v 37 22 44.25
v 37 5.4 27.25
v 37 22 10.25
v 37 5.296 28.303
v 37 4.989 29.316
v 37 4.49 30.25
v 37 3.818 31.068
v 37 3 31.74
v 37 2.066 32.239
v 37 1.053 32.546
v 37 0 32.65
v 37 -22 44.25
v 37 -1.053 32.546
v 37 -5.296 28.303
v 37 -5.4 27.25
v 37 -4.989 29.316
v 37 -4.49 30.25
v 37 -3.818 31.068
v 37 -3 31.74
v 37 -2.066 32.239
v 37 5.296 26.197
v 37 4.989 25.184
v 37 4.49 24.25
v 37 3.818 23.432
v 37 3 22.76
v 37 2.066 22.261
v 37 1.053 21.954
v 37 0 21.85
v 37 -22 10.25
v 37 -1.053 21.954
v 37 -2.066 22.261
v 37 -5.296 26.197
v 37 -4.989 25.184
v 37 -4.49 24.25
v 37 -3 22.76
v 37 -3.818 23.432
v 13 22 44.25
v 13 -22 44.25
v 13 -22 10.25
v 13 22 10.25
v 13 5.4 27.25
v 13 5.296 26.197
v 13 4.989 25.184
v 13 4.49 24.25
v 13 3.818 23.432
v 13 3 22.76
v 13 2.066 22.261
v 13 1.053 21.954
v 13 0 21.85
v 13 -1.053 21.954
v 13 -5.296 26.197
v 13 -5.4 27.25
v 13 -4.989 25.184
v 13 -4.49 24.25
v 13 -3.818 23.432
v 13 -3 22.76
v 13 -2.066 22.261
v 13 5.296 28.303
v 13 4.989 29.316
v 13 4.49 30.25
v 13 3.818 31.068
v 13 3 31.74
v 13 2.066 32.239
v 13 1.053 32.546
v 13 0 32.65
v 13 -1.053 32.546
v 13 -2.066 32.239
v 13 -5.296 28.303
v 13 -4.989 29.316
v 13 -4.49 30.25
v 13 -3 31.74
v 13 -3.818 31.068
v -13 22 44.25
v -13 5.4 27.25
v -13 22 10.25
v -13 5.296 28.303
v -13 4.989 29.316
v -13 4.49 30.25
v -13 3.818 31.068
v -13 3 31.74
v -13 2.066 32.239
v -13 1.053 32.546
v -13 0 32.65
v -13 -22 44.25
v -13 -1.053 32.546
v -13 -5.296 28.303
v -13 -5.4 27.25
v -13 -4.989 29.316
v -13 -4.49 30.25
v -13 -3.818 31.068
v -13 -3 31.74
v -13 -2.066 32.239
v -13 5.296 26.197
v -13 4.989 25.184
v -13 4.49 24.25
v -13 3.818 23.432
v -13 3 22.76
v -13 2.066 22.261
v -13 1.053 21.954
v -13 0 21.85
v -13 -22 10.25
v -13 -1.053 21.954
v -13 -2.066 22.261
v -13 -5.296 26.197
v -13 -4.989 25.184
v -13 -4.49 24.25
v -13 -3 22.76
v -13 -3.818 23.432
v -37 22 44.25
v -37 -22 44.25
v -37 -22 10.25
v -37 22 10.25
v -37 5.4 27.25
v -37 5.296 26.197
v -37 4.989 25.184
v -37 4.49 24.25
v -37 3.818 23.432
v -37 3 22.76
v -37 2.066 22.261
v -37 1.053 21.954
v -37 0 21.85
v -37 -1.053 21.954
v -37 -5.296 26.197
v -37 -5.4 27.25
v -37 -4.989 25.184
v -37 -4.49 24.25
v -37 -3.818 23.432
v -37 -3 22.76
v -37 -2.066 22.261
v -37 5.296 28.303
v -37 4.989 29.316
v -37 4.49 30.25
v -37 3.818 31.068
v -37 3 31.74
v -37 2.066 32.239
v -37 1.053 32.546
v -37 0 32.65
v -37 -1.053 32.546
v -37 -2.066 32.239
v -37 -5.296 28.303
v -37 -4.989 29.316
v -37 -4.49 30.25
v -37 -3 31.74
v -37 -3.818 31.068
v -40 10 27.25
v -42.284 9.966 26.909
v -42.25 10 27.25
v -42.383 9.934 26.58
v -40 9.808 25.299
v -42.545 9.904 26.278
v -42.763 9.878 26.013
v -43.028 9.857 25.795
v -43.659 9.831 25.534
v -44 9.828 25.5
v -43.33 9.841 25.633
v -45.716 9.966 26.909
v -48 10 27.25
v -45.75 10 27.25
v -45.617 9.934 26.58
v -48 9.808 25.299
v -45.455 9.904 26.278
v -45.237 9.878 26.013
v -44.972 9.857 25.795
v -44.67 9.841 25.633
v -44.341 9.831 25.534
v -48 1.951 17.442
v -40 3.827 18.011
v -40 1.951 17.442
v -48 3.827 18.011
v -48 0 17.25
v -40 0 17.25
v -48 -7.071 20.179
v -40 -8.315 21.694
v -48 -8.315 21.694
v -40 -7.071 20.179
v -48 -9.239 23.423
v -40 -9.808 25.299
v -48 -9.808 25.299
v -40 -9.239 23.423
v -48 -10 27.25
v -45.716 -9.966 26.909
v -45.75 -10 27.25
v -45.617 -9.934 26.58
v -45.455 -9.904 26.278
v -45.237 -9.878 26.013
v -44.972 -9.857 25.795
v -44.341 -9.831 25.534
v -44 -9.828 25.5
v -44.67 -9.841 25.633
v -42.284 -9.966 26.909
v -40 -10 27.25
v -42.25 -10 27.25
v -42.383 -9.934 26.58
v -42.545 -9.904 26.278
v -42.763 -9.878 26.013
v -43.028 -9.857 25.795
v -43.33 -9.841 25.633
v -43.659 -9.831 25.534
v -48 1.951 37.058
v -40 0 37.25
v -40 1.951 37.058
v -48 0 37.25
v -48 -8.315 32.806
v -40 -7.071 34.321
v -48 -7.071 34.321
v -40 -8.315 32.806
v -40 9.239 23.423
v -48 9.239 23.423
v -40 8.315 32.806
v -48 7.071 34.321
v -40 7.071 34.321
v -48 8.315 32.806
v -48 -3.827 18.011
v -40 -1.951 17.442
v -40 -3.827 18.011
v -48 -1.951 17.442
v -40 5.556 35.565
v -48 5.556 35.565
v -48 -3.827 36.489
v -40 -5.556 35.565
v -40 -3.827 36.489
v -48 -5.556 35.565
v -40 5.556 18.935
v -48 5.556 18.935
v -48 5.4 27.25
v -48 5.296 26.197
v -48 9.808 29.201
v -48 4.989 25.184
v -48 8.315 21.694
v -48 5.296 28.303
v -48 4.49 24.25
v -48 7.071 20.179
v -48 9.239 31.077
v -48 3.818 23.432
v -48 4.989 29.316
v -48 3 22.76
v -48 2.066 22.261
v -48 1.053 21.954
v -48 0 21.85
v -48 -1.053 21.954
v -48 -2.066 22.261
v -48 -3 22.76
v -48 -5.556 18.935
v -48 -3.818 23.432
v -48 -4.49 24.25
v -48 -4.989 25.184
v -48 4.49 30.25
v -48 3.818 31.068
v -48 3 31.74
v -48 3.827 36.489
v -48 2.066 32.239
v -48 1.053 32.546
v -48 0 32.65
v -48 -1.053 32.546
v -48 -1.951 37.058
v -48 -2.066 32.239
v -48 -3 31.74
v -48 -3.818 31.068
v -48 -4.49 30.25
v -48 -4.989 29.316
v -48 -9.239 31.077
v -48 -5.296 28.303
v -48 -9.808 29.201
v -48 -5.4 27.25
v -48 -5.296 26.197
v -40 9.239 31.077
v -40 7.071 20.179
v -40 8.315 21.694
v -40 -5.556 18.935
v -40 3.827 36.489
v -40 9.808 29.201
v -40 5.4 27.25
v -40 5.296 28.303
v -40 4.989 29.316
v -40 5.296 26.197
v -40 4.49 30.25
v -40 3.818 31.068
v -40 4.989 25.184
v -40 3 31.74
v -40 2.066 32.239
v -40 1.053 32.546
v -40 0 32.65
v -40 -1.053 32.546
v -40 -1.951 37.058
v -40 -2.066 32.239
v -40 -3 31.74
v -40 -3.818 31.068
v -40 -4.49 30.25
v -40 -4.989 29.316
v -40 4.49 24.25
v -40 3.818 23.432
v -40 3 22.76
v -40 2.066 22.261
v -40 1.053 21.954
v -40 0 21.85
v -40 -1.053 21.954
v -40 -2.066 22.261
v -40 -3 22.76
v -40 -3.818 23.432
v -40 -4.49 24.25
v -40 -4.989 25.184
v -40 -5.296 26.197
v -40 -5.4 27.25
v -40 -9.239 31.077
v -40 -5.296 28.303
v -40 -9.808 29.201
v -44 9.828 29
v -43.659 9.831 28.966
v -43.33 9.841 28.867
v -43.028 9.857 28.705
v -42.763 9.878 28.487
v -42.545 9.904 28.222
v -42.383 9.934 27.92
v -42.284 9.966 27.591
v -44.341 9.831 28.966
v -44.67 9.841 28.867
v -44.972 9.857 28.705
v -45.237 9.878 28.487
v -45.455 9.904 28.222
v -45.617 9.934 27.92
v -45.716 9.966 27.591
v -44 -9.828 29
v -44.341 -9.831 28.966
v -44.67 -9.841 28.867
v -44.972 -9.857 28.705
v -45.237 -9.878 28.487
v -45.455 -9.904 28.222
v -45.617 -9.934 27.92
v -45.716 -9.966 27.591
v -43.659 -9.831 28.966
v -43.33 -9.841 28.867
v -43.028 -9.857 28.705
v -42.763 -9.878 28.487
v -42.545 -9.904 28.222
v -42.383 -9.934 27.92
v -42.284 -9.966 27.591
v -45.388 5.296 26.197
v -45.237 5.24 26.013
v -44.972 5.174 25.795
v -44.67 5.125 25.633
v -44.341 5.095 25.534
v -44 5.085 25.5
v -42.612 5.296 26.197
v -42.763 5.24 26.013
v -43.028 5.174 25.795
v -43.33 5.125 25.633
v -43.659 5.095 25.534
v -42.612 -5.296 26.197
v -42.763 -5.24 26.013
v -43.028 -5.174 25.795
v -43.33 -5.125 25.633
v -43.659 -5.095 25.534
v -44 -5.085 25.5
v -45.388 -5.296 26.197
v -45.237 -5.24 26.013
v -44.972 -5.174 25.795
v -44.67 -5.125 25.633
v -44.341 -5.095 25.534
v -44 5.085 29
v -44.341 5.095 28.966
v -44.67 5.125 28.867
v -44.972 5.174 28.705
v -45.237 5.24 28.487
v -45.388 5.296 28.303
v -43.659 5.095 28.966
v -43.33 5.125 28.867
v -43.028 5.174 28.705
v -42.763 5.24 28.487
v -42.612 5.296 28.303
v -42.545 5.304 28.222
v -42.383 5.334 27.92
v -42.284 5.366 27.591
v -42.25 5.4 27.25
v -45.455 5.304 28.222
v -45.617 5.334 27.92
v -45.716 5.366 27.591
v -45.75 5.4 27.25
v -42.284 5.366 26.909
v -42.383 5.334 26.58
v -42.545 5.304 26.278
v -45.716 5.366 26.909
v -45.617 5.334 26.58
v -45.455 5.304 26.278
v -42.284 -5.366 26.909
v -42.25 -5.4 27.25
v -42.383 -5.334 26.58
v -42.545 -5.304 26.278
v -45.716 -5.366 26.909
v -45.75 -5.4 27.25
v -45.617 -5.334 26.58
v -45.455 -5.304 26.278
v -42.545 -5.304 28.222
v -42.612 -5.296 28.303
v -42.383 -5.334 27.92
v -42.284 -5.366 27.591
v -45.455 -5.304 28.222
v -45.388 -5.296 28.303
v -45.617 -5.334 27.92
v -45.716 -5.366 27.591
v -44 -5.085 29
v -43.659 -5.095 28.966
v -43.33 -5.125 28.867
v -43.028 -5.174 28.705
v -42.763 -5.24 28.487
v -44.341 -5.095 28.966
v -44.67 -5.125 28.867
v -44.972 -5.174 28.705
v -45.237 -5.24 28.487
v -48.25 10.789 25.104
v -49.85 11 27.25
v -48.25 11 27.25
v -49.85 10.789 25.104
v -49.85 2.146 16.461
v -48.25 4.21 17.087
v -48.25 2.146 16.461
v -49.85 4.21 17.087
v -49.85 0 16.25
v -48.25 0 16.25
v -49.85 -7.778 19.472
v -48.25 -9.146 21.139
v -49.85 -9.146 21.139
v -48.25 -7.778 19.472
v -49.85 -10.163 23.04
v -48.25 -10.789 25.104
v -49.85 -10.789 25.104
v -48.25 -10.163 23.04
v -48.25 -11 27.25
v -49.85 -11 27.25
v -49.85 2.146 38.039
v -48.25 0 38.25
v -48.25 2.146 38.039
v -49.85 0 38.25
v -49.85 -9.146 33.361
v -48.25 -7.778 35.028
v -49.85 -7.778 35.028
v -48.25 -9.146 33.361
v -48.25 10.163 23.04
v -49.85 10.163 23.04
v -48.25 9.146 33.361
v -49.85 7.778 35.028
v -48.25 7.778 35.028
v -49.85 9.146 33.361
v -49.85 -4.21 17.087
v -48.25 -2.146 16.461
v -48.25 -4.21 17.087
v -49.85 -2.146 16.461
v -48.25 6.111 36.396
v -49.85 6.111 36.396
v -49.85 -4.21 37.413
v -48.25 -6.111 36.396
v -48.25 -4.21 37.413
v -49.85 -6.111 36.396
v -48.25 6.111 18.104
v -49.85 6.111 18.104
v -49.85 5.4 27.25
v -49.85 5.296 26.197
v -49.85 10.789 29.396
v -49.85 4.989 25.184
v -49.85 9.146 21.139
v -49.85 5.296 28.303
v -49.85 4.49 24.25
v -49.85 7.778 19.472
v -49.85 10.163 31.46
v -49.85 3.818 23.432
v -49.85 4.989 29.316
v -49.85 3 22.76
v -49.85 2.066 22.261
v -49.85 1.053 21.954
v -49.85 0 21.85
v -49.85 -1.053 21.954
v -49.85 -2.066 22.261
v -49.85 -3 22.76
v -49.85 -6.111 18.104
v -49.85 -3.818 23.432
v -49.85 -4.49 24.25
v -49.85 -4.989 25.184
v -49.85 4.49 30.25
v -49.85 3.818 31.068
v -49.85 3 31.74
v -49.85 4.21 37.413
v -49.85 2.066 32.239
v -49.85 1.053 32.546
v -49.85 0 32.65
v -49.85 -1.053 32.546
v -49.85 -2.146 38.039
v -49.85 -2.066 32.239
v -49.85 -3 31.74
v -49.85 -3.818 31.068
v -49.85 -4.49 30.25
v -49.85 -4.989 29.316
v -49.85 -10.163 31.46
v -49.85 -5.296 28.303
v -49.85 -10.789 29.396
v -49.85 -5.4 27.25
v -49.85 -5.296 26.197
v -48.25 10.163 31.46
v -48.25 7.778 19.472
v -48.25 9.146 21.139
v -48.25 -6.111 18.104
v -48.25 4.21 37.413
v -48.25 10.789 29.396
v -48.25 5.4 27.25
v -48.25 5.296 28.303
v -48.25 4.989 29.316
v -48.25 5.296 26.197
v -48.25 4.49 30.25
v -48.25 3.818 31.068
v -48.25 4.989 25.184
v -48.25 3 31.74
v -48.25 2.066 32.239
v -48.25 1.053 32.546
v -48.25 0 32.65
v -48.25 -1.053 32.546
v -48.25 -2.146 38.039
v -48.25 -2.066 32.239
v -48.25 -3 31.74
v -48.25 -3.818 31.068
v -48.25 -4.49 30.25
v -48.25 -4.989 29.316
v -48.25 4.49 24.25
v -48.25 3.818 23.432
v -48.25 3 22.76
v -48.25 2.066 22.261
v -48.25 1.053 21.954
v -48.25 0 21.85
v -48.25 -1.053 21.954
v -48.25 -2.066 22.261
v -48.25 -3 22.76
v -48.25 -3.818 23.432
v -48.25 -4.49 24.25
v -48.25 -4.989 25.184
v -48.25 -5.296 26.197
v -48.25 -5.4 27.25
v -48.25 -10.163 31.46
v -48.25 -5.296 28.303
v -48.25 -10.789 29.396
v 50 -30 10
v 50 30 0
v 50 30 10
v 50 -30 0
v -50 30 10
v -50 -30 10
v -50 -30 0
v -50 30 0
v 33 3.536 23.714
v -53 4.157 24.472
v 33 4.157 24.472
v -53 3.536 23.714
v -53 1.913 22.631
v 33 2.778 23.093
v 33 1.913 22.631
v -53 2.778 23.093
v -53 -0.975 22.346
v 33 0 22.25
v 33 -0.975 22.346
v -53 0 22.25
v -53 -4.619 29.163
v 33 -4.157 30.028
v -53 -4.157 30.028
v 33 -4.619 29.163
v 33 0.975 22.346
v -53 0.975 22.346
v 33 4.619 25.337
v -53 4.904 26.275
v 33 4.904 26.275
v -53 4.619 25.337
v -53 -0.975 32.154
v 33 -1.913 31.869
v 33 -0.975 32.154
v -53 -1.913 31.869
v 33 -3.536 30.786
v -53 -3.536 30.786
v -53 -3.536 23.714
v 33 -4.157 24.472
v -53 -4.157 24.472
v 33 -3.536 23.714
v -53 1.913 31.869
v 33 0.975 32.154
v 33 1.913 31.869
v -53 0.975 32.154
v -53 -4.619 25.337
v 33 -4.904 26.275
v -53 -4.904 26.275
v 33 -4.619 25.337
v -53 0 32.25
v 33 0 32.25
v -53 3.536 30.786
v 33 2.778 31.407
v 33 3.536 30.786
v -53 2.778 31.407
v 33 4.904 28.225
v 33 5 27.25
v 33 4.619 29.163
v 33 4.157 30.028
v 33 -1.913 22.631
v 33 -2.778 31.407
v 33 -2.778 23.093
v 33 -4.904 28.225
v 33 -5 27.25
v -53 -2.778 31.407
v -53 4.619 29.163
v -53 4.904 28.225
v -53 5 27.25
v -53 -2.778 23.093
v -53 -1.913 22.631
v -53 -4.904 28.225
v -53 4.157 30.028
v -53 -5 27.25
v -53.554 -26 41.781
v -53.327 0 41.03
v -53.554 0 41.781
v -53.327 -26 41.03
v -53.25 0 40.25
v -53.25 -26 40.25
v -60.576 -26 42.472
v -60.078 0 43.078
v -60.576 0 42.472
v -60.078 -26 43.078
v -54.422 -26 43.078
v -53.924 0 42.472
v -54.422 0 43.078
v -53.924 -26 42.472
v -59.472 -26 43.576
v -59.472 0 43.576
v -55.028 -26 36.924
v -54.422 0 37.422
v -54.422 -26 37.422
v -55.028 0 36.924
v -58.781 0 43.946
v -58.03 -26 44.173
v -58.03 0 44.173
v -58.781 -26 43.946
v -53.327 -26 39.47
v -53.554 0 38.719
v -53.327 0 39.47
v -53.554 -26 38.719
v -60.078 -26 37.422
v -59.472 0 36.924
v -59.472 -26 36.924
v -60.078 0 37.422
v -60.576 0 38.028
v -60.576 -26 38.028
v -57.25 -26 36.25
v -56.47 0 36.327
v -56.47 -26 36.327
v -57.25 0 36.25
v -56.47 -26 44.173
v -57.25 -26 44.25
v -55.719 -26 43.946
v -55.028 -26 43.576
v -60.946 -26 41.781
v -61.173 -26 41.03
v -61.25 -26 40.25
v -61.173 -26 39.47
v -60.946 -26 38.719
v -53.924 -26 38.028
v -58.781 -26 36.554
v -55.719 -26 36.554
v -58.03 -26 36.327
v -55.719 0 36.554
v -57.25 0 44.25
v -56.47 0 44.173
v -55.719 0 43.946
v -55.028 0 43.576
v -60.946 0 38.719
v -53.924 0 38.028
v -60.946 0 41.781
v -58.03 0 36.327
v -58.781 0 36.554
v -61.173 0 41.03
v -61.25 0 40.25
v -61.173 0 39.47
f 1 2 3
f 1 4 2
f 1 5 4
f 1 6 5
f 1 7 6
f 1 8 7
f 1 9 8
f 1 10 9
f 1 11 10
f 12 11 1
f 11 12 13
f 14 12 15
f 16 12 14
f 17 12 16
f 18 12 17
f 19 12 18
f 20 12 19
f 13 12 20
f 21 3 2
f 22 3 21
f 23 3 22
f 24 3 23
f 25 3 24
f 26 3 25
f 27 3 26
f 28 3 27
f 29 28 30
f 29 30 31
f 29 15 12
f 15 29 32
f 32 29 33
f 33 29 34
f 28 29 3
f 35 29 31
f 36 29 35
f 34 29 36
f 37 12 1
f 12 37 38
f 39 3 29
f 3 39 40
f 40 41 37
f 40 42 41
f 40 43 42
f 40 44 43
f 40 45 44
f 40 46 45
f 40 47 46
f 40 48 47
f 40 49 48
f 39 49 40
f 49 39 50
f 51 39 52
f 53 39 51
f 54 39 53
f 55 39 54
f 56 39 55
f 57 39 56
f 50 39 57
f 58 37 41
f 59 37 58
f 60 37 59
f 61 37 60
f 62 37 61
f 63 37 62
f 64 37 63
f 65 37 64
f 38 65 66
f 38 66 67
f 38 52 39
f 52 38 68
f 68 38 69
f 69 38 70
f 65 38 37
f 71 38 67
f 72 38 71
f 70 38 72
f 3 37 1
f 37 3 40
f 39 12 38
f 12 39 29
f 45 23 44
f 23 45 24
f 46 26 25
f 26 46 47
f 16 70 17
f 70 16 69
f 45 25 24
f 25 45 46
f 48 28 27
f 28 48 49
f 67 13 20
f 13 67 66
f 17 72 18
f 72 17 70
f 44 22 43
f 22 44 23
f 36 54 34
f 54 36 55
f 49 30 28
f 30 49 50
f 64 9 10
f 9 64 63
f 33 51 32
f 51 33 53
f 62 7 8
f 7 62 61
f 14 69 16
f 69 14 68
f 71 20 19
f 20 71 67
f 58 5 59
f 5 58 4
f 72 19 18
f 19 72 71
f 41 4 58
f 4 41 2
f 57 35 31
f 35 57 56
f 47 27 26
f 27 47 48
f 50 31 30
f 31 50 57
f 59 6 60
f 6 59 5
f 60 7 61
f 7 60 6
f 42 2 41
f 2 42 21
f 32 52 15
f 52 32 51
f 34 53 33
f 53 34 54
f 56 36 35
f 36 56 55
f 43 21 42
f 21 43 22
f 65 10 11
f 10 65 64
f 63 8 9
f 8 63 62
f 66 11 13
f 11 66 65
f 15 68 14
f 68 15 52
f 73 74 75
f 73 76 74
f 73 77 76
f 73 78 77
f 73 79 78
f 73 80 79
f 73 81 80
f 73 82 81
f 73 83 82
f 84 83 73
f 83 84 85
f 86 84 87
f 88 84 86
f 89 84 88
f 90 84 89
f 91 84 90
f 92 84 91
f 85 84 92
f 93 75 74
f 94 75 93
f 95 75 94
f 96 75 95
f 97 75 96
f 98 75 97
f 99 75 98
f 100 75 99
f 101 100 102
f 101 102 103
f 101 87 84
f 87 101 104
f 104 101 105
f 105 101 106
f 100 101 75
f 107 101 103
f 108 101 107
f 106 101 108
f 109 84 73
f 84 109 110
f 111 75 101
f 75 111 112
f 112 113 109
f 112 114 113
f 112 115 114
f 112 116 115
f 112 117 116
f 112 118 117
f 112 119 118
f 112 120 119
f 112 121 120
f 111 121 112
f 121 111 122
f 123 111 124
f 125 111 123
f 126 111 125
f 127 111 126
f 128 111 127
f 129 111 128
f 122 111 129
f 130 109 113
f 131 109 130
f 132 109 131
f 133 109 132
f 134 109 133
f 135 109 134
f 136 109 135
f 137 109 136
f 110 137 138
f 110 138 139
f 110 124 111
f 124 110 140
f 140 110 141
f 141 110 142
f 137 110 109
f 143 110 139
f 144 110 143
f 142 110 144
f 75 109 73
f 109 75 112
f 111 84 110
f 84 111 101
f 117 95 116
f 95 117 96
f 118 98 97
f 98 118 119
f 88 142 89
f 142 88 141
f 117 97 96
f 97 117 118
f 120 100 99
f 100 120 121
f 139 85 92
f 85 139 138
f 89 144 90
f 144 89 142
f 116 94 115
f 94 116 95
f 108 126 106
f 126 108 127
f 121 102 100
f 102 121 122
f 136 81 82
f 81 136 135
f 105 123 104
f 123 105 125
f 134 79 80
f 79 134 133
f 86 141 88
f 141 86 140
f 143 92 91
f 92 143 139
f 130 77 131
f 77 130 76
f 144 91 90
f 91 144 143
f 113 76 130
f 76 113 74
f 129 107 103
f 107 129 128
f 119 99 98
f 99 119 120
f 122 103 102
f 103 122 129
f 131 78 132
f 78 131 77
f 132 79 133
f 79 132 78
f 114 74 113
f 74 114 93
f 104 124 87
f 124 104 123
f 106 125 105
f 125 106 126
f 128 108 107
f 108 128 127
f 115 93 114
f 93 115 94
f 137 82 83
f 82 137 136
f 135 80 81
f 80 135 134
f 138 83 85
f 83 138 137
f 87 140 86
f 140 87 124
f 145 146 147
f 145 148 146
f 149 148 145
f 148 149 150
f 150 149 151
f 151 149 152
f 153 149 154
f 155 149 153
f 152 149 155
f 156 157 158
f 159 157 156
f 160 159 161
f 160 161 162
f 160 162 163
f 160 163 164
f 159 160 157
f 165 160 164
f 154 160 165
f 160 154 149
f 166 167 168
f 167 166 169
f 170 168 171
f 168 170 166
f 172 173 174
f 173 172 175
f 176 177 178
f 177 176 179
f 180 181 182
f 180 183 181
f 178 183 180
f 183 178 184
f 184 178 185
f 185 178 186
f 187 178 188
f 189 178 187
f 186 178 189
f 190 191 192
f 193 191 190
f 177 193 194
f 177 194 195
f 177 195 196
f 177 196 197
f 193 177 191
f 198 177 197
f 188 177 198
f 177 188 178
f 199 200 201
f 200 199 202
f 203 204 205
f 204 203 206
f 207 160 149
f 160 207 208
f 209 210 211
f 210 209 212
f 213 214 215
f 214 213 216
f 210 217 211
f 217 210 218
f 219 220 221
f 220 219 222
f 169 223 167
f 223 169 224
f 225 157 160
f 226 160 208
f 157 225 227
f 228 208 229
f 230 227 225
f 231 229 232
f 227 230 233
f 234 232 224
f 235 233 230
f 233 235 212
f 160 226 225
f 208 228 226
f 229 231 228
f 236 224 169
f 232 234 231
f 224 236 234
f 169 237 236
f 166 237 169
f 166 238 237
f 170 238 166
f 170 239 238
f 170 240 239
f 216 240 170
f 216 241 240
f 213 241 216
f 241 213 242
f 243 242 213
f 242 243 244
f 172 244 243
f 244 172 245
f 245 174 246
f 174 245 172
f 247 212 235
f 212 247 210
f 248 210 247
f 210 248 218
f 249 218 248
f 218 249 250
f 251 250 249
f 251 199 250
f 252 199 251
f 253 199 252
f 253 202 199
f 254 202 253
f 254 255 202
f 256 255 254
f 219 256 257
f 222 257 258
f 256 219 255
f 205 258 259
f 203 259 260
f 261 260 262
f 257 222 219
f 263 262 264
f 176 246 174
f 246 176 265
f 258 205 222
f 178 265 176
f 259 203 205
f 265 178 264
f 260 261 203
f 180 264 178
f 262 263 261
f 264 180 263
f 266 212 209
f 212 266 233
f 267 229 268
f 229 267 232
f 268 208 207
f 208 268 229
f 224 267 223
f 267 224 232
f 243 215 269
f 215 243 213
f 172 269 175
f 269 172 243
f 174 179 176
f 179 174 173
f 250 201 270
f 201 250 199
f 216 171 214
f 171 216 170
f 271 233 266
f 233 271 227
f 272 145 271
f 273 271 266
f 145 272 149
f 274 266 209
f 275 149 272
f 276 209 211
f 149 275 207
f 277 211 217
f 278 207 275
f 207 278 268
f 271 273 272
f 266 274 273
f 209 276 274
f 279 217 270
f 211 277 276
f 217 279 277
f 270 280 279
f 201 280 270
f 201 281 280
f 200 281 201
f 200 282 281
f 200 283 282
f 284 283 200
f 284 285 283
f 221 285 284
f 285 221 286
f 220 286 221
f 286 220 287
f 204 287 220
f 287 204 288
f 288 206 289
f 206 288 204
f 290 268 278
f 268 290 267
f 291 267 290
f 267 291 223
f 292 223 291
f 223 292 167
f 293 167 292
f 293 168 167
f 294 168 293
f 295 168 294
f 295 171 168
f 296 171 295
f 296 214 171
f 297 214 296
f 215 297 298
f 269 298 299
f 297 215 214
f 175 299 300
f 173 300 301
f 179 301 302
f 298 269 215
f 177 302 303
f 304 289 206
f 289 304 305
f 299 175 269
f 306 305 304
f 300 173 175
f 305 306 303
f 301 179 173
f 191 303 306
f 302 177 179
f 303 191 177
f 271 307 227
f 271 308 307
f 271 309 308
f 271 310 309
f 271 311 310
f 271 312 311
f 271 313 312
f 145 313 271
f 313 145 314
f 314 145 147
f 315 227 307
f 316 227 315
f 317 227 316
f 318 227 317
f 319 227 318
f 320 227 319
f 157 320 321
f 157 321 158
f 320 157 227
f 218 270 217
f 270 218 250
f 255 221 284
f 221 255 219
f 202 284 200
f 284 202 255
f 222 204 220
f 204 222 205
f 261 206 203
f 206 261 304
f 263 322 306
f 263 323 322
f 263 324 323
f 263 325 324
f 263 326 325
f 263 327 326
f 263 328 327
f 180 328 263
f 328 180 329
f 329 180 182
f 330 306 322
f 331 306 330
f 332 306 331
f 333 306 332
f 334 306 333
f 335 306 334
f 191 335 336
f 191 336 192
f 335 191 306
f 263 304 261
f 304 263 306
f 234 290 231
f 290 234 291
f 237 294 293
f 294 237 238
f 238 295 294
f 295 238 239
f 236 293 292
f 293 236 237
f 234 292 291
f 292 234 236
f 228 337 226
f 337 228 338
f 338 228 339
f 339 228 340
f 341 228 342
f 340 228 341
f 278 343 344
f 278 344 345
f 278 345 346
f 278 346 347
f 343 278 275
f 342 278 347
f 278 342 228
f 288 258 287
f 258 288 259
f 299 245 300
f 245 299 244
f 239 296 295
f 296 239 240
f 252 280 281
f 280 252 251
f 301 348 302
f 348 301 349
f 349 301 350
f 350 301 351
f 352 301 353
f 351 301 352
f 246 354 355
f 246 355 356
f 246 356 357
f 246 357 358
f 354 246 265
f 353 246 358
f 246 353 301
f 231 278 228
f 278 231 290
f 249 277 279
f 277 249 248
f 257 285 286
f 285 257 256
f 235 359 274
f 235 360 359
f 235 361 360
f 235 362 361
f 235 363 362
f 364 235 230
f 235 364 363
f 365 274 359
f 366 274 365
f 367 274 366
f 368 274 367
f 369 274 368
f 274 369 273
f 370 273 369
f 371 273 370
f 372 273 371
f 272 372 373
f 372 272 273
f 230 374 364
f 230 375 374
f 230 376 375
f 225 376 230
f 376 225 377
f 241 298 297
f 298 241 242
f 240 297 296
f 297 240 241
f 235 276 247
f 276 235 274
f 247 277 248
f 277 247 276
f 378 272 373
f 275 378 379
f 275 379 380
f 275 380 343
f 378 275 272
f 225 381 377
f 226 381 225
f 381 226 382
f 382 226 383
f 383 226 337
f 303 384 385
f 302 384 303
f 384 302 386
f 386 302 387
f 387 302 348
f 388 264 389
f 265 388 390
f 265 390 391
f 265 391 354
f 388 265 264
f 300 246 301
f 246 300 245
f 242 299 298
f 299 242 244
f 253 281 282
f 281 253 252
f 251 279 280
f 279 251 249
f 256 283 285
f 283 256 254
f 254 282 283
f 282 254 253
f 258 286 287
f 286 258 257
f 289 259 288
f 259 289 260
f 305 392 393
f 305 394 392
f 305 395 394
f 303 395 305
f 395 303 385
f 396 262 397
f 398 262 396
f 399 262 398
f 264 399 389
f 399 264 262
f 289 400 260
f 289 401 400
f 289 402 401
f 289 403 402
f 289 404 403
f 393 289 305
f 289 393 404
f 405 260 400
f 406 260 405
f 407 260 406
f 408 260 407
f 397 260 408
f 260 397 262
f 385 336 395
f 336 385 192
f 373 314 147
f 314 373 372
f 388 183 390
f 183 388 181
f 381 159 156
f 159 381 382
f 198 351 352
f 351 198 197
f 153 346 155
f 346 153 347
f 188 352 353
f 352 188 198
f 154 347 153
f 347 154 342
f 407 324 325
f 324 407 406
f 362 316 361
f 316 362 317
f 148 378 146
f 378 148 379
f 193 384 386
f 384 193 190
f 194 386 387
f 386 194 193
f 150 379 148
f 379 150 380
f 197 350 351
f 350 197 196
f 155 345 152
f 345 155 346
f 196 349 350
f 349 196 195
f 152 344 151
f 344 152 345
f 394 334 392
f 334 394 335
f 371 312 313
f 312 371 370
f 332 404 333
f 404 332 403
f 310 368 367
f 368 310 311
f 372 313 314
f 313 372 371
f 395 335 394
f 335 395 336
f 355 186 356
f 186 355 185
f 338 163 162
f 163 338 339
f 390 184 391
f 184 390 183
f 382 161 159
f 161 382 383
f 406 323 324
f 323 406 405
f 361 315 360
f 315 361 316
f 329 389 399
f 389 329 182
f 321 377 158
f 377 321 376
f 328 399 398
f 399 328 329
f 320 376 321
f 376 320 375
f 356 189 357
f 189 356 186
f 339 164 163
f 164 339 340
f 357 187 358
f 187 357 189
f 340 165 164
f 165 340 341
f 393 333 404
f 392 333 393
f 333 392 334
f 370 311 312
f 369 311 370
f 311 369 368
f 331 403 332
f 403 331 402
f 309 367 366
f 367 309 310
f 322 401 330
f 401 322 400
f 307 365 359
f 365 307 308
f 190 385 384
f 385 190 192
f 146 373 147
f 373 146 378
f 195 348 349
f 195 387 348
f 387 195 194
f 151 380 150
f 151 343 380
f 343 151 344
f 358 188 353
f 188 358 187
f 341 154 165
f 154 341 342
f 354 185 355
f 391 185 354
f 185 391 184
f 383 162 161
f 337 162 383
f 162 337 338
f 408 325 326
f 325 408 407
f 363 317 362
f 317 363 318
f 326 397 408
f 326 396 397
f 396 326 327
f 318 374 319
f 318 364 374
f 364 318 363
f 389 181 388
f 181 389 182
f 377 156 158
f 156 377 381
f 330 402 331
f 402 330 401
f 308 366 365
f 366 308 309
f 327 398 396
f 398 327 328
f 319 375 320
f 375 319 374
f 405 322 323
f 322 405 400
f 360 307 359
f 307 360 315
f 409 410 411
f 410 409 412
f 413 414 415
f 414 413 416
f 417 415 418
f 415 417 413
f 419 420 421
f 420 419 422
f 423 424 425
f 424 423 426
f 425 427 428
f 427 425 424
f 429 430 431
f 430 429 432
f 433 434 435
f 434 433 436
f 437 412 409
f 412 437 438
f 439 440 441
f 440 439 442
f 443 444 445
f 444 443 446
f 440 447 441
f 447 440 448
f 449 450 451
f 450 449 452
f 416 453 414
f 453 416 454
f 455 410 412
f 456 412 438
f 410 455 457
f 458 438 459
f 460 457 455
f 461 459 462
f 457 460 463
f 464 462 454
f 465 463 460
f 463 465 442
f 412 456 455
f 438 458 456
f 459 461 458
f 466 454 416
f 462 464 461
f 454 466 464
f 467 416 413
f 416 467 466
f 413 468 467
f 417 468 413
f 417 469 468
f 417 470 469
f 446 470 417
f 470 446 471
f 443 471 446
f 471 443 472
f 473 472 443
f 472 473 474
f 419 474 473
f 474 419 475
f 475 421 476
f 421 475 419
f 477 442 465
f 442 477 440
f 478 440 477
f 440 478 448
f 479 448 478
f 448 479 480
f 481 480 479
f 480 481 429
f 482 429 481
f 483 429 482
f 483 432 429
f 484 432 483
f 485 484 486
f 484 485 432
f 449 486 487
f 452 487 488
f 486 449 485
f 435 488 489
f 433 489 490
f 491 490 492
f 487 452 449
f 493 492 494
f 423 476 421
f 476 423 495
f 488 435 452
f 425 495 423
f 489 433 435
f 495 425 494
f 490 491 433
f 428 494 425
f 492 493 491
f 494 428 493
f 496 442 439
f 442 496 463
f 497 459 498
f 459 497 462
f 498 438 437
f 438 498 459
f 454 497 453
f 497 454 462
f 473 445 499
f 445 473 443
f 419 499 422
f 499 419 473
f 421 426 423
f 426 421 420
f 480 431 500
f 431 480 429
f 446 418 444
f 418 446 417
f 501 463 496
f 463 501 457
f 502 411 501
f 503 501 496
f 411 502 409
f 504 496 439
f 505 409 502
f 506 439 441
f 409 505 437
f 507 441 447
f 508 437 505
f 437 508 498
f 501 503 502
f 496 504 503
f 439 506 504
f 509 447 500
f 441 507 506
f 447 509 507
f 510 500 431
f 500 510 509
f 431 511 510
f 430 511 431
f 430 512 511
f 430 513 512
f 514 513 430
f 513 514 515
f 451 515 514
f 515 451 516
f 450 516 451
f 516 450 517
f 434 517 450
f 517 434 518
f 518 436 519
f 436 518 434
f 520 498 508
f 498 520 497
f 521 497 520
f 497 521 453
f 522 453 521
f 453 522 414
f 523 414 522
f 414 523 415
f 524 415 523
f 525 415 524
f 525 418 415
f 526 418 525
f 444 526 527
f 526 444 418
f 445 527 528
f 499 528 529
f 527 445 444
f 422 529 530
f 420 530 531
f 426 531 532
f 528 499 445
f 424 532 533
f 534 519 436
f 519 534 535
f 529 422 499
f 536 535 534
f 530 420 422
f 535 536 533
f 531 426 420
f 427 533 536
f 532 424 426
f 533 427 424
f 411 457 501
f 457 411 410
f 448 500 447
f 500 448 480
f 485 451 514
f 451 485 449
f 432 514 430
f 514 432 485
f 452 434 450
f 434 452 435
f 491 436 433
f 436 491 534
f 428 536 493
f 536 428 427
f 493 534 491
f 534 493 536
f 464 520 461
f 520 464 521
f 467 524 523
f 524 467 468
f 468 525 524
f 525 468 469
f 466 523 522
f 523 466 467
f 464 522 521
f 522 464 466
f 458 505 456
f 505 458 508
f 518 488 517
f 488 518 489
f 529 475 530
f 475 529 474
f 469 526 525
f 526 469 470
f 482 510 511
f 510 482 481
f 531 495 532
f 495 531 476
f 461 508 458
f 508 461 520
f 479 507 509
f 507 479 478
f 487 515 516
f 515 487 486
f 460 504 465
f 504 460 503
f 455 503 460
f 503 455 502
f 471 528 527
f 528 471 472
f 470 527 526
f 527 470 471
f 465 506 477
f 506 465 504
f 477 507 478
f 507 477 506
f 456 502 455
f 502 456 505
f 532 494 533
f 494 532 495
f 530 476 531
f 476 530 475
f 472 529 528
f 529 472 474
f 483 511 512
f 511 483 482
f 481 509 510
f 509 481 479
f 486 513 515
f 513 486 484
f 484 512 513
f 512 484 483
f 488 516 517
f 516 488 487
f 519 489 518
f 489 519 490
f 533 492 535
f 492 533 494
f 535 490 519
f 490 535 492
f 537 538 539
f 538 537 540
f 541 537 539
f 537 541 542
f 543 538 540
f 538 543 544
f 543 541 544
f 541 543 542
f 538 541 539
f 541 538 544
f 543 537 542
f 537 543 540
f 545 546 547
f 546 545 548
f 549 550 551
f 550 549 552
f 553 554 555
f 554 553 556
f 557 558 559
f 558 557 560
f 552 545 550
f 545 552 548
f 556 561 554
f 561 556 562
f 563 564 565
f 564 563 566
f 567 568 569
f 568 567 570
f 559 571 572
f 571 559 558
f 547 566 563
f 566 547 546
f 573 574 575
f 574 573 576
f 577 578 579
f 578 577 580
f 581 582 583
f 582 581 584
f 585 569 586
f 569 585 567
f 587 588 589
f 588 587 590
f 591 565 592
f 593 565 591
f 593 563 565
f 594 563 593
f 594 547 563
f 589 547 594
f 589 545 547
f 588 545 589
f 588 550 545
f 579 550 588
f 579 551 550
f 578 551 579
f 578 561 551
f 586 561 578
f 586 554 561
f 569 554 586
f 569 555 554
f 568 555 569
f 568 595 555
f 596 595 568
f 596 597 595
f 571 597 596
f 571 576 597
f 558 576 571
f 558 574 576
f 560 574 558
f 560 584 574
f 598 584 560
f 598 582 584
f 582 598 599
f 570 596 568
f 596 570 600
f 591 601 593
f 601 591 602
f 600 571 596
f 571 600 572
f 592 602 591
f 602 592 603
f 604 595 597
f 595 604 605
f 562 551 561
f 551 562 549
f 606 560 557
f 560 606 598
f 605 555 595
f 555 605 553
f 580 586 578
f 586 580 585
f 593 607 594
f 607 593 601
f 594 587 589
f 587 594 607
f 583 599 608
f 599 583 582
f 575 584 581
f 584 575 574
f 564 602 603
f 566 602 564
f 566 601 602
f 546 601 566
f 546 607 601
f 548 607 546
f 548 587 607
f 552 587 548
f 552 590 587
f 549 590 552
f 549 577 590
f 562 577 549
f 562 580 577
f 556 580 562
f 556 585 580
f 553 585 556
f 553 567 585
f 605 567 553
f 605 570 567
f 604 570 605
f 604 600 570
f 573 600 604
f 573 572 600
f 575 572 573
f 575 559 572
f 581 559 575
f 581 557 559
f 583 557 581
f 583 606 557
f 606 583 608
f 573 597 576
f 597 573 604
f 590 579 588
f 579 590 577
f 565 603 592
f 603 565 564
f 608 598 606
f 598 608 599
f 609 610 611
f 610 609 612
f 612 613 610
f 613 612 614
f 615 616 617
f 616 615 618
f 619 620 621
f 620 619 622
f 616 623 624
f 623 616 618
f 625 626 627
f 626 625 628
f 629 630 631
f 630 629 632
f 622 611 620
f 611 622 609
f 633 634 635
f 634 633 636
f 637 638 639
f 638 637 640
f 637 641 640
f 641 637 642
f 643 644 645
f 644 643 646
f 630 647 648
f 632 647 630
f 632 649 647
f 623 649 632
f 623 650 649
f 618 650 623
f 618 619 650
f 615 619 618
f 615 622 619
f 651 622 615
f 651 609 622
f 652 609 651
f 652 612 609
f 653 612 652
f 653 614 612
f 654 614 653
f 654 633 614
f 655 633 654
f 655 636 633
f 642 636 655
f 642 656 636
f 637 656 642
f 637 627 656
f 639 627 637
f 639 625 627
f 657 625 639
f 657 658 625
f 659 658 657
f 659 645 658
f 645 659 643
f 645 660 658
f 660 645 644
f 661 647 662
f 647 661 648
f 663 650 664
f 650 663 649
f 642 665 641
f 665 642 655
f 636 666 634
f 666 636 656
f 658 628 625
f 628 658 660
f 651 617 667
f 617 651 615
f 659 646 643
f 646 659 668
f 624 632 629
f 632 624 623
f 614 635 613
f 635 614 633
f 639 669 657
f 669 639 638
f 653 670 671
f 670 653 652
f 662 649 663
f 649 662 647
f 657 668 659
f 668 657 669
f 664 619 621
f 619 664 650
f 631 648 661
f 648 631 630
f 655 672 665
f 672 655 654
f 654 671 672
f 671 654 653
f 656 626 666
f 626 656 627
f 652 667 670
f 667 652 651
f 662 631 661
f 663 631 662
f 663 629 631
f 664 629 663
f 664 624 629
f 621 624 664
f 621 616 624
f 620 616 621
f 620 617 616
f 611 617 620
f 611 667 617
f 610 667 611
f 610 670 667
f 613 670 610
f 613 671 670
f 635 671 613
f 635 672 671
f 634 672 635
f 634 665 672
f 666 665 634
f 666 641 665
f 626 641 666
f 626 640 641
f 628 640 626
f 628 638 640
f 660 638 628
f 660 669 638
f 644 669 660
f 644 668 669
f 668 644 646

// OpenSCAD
$fn = 32;

// ------------------------------------------------------------------------
// Machine vise: screw d10, jaws 24 x 34 mm
// Every part is its own module, assembly() places every instance.
// ------------------------------------------------------------------------

// --- part 1 ---
module vise_bed() {
  difference() {
    translate([-50, -30, 0]) cube([100, 60, 10]);
  }
}

// --- part 2 ---
module vise_jaw() {
  difference() {
    translate([-12, -22, 0]) cube([24, 44, 34]);
    translate([0, 0, 17]) rotate([0, 90, 0]) cylinder(h = 26, d = 10.8, center = true);
  }
}

// --- part 3 ---
module vise_screw() {
  translate([0, 0, -43]) cylinder(h = 86, d = 10);
}

// --- part 4 ---
module screw_collar() {
  difference() {
    cylinder(h = 8, d = 20);
    translate([0, 0, -1]) cylinder(h = 10, d = 10.8);
    translate([0, 0, 4]) rotate([90, 0, 0]) cylinder(h = 22, d = 3.5, center = true);
  }
}

// --- part 5 ---
module screw_washer() {
  difference() {
      translate([0, 0, 0]) cylinder(h = 1.6, d = 22);
      translate([0, 0, -1]) cylinder(h = 3.6, d = 10.8);
    }
}

// --- part 6 ---
module vise_handle() {
  cylinder(h = 26, d = 8);
}

// --- assembly ---
module assembly() {
  color([0.80, 0.24, 0.20]) translate([0, 0, 0]) rotate([0, 0, 0]) vise_bed();
  color([0.20, 0.45, 0.75]) translate([25, 0, 10.25]) rotate([0, 0, 0]) vise_jaw();
  color([0.25, 0.62, 0.32]) translate([-25, 0, 10.25]) rotate([0, 0, 0]) vise_jaw();
  color([0.92, 0.70, 0.18]) translate([-10, 0, 27.25]) rotate([0, 90, 0]) vise_screw();
  color([0.58, 0.35, 0.70]) translate([-48, 0, 27.25]) rotate([0, 90, 0]) screw_collar();
  color([0.16, 0.66, 0.66]) translate([-49.85, 0, 27.25]) rotate([0, 90, 0]) screw_washer();
  color([0.85, 0.48, 0.18]) translate([-57.25, 0, 40.25]) rotate([90, 0, 0]) vise_handle();
}

assembly();
